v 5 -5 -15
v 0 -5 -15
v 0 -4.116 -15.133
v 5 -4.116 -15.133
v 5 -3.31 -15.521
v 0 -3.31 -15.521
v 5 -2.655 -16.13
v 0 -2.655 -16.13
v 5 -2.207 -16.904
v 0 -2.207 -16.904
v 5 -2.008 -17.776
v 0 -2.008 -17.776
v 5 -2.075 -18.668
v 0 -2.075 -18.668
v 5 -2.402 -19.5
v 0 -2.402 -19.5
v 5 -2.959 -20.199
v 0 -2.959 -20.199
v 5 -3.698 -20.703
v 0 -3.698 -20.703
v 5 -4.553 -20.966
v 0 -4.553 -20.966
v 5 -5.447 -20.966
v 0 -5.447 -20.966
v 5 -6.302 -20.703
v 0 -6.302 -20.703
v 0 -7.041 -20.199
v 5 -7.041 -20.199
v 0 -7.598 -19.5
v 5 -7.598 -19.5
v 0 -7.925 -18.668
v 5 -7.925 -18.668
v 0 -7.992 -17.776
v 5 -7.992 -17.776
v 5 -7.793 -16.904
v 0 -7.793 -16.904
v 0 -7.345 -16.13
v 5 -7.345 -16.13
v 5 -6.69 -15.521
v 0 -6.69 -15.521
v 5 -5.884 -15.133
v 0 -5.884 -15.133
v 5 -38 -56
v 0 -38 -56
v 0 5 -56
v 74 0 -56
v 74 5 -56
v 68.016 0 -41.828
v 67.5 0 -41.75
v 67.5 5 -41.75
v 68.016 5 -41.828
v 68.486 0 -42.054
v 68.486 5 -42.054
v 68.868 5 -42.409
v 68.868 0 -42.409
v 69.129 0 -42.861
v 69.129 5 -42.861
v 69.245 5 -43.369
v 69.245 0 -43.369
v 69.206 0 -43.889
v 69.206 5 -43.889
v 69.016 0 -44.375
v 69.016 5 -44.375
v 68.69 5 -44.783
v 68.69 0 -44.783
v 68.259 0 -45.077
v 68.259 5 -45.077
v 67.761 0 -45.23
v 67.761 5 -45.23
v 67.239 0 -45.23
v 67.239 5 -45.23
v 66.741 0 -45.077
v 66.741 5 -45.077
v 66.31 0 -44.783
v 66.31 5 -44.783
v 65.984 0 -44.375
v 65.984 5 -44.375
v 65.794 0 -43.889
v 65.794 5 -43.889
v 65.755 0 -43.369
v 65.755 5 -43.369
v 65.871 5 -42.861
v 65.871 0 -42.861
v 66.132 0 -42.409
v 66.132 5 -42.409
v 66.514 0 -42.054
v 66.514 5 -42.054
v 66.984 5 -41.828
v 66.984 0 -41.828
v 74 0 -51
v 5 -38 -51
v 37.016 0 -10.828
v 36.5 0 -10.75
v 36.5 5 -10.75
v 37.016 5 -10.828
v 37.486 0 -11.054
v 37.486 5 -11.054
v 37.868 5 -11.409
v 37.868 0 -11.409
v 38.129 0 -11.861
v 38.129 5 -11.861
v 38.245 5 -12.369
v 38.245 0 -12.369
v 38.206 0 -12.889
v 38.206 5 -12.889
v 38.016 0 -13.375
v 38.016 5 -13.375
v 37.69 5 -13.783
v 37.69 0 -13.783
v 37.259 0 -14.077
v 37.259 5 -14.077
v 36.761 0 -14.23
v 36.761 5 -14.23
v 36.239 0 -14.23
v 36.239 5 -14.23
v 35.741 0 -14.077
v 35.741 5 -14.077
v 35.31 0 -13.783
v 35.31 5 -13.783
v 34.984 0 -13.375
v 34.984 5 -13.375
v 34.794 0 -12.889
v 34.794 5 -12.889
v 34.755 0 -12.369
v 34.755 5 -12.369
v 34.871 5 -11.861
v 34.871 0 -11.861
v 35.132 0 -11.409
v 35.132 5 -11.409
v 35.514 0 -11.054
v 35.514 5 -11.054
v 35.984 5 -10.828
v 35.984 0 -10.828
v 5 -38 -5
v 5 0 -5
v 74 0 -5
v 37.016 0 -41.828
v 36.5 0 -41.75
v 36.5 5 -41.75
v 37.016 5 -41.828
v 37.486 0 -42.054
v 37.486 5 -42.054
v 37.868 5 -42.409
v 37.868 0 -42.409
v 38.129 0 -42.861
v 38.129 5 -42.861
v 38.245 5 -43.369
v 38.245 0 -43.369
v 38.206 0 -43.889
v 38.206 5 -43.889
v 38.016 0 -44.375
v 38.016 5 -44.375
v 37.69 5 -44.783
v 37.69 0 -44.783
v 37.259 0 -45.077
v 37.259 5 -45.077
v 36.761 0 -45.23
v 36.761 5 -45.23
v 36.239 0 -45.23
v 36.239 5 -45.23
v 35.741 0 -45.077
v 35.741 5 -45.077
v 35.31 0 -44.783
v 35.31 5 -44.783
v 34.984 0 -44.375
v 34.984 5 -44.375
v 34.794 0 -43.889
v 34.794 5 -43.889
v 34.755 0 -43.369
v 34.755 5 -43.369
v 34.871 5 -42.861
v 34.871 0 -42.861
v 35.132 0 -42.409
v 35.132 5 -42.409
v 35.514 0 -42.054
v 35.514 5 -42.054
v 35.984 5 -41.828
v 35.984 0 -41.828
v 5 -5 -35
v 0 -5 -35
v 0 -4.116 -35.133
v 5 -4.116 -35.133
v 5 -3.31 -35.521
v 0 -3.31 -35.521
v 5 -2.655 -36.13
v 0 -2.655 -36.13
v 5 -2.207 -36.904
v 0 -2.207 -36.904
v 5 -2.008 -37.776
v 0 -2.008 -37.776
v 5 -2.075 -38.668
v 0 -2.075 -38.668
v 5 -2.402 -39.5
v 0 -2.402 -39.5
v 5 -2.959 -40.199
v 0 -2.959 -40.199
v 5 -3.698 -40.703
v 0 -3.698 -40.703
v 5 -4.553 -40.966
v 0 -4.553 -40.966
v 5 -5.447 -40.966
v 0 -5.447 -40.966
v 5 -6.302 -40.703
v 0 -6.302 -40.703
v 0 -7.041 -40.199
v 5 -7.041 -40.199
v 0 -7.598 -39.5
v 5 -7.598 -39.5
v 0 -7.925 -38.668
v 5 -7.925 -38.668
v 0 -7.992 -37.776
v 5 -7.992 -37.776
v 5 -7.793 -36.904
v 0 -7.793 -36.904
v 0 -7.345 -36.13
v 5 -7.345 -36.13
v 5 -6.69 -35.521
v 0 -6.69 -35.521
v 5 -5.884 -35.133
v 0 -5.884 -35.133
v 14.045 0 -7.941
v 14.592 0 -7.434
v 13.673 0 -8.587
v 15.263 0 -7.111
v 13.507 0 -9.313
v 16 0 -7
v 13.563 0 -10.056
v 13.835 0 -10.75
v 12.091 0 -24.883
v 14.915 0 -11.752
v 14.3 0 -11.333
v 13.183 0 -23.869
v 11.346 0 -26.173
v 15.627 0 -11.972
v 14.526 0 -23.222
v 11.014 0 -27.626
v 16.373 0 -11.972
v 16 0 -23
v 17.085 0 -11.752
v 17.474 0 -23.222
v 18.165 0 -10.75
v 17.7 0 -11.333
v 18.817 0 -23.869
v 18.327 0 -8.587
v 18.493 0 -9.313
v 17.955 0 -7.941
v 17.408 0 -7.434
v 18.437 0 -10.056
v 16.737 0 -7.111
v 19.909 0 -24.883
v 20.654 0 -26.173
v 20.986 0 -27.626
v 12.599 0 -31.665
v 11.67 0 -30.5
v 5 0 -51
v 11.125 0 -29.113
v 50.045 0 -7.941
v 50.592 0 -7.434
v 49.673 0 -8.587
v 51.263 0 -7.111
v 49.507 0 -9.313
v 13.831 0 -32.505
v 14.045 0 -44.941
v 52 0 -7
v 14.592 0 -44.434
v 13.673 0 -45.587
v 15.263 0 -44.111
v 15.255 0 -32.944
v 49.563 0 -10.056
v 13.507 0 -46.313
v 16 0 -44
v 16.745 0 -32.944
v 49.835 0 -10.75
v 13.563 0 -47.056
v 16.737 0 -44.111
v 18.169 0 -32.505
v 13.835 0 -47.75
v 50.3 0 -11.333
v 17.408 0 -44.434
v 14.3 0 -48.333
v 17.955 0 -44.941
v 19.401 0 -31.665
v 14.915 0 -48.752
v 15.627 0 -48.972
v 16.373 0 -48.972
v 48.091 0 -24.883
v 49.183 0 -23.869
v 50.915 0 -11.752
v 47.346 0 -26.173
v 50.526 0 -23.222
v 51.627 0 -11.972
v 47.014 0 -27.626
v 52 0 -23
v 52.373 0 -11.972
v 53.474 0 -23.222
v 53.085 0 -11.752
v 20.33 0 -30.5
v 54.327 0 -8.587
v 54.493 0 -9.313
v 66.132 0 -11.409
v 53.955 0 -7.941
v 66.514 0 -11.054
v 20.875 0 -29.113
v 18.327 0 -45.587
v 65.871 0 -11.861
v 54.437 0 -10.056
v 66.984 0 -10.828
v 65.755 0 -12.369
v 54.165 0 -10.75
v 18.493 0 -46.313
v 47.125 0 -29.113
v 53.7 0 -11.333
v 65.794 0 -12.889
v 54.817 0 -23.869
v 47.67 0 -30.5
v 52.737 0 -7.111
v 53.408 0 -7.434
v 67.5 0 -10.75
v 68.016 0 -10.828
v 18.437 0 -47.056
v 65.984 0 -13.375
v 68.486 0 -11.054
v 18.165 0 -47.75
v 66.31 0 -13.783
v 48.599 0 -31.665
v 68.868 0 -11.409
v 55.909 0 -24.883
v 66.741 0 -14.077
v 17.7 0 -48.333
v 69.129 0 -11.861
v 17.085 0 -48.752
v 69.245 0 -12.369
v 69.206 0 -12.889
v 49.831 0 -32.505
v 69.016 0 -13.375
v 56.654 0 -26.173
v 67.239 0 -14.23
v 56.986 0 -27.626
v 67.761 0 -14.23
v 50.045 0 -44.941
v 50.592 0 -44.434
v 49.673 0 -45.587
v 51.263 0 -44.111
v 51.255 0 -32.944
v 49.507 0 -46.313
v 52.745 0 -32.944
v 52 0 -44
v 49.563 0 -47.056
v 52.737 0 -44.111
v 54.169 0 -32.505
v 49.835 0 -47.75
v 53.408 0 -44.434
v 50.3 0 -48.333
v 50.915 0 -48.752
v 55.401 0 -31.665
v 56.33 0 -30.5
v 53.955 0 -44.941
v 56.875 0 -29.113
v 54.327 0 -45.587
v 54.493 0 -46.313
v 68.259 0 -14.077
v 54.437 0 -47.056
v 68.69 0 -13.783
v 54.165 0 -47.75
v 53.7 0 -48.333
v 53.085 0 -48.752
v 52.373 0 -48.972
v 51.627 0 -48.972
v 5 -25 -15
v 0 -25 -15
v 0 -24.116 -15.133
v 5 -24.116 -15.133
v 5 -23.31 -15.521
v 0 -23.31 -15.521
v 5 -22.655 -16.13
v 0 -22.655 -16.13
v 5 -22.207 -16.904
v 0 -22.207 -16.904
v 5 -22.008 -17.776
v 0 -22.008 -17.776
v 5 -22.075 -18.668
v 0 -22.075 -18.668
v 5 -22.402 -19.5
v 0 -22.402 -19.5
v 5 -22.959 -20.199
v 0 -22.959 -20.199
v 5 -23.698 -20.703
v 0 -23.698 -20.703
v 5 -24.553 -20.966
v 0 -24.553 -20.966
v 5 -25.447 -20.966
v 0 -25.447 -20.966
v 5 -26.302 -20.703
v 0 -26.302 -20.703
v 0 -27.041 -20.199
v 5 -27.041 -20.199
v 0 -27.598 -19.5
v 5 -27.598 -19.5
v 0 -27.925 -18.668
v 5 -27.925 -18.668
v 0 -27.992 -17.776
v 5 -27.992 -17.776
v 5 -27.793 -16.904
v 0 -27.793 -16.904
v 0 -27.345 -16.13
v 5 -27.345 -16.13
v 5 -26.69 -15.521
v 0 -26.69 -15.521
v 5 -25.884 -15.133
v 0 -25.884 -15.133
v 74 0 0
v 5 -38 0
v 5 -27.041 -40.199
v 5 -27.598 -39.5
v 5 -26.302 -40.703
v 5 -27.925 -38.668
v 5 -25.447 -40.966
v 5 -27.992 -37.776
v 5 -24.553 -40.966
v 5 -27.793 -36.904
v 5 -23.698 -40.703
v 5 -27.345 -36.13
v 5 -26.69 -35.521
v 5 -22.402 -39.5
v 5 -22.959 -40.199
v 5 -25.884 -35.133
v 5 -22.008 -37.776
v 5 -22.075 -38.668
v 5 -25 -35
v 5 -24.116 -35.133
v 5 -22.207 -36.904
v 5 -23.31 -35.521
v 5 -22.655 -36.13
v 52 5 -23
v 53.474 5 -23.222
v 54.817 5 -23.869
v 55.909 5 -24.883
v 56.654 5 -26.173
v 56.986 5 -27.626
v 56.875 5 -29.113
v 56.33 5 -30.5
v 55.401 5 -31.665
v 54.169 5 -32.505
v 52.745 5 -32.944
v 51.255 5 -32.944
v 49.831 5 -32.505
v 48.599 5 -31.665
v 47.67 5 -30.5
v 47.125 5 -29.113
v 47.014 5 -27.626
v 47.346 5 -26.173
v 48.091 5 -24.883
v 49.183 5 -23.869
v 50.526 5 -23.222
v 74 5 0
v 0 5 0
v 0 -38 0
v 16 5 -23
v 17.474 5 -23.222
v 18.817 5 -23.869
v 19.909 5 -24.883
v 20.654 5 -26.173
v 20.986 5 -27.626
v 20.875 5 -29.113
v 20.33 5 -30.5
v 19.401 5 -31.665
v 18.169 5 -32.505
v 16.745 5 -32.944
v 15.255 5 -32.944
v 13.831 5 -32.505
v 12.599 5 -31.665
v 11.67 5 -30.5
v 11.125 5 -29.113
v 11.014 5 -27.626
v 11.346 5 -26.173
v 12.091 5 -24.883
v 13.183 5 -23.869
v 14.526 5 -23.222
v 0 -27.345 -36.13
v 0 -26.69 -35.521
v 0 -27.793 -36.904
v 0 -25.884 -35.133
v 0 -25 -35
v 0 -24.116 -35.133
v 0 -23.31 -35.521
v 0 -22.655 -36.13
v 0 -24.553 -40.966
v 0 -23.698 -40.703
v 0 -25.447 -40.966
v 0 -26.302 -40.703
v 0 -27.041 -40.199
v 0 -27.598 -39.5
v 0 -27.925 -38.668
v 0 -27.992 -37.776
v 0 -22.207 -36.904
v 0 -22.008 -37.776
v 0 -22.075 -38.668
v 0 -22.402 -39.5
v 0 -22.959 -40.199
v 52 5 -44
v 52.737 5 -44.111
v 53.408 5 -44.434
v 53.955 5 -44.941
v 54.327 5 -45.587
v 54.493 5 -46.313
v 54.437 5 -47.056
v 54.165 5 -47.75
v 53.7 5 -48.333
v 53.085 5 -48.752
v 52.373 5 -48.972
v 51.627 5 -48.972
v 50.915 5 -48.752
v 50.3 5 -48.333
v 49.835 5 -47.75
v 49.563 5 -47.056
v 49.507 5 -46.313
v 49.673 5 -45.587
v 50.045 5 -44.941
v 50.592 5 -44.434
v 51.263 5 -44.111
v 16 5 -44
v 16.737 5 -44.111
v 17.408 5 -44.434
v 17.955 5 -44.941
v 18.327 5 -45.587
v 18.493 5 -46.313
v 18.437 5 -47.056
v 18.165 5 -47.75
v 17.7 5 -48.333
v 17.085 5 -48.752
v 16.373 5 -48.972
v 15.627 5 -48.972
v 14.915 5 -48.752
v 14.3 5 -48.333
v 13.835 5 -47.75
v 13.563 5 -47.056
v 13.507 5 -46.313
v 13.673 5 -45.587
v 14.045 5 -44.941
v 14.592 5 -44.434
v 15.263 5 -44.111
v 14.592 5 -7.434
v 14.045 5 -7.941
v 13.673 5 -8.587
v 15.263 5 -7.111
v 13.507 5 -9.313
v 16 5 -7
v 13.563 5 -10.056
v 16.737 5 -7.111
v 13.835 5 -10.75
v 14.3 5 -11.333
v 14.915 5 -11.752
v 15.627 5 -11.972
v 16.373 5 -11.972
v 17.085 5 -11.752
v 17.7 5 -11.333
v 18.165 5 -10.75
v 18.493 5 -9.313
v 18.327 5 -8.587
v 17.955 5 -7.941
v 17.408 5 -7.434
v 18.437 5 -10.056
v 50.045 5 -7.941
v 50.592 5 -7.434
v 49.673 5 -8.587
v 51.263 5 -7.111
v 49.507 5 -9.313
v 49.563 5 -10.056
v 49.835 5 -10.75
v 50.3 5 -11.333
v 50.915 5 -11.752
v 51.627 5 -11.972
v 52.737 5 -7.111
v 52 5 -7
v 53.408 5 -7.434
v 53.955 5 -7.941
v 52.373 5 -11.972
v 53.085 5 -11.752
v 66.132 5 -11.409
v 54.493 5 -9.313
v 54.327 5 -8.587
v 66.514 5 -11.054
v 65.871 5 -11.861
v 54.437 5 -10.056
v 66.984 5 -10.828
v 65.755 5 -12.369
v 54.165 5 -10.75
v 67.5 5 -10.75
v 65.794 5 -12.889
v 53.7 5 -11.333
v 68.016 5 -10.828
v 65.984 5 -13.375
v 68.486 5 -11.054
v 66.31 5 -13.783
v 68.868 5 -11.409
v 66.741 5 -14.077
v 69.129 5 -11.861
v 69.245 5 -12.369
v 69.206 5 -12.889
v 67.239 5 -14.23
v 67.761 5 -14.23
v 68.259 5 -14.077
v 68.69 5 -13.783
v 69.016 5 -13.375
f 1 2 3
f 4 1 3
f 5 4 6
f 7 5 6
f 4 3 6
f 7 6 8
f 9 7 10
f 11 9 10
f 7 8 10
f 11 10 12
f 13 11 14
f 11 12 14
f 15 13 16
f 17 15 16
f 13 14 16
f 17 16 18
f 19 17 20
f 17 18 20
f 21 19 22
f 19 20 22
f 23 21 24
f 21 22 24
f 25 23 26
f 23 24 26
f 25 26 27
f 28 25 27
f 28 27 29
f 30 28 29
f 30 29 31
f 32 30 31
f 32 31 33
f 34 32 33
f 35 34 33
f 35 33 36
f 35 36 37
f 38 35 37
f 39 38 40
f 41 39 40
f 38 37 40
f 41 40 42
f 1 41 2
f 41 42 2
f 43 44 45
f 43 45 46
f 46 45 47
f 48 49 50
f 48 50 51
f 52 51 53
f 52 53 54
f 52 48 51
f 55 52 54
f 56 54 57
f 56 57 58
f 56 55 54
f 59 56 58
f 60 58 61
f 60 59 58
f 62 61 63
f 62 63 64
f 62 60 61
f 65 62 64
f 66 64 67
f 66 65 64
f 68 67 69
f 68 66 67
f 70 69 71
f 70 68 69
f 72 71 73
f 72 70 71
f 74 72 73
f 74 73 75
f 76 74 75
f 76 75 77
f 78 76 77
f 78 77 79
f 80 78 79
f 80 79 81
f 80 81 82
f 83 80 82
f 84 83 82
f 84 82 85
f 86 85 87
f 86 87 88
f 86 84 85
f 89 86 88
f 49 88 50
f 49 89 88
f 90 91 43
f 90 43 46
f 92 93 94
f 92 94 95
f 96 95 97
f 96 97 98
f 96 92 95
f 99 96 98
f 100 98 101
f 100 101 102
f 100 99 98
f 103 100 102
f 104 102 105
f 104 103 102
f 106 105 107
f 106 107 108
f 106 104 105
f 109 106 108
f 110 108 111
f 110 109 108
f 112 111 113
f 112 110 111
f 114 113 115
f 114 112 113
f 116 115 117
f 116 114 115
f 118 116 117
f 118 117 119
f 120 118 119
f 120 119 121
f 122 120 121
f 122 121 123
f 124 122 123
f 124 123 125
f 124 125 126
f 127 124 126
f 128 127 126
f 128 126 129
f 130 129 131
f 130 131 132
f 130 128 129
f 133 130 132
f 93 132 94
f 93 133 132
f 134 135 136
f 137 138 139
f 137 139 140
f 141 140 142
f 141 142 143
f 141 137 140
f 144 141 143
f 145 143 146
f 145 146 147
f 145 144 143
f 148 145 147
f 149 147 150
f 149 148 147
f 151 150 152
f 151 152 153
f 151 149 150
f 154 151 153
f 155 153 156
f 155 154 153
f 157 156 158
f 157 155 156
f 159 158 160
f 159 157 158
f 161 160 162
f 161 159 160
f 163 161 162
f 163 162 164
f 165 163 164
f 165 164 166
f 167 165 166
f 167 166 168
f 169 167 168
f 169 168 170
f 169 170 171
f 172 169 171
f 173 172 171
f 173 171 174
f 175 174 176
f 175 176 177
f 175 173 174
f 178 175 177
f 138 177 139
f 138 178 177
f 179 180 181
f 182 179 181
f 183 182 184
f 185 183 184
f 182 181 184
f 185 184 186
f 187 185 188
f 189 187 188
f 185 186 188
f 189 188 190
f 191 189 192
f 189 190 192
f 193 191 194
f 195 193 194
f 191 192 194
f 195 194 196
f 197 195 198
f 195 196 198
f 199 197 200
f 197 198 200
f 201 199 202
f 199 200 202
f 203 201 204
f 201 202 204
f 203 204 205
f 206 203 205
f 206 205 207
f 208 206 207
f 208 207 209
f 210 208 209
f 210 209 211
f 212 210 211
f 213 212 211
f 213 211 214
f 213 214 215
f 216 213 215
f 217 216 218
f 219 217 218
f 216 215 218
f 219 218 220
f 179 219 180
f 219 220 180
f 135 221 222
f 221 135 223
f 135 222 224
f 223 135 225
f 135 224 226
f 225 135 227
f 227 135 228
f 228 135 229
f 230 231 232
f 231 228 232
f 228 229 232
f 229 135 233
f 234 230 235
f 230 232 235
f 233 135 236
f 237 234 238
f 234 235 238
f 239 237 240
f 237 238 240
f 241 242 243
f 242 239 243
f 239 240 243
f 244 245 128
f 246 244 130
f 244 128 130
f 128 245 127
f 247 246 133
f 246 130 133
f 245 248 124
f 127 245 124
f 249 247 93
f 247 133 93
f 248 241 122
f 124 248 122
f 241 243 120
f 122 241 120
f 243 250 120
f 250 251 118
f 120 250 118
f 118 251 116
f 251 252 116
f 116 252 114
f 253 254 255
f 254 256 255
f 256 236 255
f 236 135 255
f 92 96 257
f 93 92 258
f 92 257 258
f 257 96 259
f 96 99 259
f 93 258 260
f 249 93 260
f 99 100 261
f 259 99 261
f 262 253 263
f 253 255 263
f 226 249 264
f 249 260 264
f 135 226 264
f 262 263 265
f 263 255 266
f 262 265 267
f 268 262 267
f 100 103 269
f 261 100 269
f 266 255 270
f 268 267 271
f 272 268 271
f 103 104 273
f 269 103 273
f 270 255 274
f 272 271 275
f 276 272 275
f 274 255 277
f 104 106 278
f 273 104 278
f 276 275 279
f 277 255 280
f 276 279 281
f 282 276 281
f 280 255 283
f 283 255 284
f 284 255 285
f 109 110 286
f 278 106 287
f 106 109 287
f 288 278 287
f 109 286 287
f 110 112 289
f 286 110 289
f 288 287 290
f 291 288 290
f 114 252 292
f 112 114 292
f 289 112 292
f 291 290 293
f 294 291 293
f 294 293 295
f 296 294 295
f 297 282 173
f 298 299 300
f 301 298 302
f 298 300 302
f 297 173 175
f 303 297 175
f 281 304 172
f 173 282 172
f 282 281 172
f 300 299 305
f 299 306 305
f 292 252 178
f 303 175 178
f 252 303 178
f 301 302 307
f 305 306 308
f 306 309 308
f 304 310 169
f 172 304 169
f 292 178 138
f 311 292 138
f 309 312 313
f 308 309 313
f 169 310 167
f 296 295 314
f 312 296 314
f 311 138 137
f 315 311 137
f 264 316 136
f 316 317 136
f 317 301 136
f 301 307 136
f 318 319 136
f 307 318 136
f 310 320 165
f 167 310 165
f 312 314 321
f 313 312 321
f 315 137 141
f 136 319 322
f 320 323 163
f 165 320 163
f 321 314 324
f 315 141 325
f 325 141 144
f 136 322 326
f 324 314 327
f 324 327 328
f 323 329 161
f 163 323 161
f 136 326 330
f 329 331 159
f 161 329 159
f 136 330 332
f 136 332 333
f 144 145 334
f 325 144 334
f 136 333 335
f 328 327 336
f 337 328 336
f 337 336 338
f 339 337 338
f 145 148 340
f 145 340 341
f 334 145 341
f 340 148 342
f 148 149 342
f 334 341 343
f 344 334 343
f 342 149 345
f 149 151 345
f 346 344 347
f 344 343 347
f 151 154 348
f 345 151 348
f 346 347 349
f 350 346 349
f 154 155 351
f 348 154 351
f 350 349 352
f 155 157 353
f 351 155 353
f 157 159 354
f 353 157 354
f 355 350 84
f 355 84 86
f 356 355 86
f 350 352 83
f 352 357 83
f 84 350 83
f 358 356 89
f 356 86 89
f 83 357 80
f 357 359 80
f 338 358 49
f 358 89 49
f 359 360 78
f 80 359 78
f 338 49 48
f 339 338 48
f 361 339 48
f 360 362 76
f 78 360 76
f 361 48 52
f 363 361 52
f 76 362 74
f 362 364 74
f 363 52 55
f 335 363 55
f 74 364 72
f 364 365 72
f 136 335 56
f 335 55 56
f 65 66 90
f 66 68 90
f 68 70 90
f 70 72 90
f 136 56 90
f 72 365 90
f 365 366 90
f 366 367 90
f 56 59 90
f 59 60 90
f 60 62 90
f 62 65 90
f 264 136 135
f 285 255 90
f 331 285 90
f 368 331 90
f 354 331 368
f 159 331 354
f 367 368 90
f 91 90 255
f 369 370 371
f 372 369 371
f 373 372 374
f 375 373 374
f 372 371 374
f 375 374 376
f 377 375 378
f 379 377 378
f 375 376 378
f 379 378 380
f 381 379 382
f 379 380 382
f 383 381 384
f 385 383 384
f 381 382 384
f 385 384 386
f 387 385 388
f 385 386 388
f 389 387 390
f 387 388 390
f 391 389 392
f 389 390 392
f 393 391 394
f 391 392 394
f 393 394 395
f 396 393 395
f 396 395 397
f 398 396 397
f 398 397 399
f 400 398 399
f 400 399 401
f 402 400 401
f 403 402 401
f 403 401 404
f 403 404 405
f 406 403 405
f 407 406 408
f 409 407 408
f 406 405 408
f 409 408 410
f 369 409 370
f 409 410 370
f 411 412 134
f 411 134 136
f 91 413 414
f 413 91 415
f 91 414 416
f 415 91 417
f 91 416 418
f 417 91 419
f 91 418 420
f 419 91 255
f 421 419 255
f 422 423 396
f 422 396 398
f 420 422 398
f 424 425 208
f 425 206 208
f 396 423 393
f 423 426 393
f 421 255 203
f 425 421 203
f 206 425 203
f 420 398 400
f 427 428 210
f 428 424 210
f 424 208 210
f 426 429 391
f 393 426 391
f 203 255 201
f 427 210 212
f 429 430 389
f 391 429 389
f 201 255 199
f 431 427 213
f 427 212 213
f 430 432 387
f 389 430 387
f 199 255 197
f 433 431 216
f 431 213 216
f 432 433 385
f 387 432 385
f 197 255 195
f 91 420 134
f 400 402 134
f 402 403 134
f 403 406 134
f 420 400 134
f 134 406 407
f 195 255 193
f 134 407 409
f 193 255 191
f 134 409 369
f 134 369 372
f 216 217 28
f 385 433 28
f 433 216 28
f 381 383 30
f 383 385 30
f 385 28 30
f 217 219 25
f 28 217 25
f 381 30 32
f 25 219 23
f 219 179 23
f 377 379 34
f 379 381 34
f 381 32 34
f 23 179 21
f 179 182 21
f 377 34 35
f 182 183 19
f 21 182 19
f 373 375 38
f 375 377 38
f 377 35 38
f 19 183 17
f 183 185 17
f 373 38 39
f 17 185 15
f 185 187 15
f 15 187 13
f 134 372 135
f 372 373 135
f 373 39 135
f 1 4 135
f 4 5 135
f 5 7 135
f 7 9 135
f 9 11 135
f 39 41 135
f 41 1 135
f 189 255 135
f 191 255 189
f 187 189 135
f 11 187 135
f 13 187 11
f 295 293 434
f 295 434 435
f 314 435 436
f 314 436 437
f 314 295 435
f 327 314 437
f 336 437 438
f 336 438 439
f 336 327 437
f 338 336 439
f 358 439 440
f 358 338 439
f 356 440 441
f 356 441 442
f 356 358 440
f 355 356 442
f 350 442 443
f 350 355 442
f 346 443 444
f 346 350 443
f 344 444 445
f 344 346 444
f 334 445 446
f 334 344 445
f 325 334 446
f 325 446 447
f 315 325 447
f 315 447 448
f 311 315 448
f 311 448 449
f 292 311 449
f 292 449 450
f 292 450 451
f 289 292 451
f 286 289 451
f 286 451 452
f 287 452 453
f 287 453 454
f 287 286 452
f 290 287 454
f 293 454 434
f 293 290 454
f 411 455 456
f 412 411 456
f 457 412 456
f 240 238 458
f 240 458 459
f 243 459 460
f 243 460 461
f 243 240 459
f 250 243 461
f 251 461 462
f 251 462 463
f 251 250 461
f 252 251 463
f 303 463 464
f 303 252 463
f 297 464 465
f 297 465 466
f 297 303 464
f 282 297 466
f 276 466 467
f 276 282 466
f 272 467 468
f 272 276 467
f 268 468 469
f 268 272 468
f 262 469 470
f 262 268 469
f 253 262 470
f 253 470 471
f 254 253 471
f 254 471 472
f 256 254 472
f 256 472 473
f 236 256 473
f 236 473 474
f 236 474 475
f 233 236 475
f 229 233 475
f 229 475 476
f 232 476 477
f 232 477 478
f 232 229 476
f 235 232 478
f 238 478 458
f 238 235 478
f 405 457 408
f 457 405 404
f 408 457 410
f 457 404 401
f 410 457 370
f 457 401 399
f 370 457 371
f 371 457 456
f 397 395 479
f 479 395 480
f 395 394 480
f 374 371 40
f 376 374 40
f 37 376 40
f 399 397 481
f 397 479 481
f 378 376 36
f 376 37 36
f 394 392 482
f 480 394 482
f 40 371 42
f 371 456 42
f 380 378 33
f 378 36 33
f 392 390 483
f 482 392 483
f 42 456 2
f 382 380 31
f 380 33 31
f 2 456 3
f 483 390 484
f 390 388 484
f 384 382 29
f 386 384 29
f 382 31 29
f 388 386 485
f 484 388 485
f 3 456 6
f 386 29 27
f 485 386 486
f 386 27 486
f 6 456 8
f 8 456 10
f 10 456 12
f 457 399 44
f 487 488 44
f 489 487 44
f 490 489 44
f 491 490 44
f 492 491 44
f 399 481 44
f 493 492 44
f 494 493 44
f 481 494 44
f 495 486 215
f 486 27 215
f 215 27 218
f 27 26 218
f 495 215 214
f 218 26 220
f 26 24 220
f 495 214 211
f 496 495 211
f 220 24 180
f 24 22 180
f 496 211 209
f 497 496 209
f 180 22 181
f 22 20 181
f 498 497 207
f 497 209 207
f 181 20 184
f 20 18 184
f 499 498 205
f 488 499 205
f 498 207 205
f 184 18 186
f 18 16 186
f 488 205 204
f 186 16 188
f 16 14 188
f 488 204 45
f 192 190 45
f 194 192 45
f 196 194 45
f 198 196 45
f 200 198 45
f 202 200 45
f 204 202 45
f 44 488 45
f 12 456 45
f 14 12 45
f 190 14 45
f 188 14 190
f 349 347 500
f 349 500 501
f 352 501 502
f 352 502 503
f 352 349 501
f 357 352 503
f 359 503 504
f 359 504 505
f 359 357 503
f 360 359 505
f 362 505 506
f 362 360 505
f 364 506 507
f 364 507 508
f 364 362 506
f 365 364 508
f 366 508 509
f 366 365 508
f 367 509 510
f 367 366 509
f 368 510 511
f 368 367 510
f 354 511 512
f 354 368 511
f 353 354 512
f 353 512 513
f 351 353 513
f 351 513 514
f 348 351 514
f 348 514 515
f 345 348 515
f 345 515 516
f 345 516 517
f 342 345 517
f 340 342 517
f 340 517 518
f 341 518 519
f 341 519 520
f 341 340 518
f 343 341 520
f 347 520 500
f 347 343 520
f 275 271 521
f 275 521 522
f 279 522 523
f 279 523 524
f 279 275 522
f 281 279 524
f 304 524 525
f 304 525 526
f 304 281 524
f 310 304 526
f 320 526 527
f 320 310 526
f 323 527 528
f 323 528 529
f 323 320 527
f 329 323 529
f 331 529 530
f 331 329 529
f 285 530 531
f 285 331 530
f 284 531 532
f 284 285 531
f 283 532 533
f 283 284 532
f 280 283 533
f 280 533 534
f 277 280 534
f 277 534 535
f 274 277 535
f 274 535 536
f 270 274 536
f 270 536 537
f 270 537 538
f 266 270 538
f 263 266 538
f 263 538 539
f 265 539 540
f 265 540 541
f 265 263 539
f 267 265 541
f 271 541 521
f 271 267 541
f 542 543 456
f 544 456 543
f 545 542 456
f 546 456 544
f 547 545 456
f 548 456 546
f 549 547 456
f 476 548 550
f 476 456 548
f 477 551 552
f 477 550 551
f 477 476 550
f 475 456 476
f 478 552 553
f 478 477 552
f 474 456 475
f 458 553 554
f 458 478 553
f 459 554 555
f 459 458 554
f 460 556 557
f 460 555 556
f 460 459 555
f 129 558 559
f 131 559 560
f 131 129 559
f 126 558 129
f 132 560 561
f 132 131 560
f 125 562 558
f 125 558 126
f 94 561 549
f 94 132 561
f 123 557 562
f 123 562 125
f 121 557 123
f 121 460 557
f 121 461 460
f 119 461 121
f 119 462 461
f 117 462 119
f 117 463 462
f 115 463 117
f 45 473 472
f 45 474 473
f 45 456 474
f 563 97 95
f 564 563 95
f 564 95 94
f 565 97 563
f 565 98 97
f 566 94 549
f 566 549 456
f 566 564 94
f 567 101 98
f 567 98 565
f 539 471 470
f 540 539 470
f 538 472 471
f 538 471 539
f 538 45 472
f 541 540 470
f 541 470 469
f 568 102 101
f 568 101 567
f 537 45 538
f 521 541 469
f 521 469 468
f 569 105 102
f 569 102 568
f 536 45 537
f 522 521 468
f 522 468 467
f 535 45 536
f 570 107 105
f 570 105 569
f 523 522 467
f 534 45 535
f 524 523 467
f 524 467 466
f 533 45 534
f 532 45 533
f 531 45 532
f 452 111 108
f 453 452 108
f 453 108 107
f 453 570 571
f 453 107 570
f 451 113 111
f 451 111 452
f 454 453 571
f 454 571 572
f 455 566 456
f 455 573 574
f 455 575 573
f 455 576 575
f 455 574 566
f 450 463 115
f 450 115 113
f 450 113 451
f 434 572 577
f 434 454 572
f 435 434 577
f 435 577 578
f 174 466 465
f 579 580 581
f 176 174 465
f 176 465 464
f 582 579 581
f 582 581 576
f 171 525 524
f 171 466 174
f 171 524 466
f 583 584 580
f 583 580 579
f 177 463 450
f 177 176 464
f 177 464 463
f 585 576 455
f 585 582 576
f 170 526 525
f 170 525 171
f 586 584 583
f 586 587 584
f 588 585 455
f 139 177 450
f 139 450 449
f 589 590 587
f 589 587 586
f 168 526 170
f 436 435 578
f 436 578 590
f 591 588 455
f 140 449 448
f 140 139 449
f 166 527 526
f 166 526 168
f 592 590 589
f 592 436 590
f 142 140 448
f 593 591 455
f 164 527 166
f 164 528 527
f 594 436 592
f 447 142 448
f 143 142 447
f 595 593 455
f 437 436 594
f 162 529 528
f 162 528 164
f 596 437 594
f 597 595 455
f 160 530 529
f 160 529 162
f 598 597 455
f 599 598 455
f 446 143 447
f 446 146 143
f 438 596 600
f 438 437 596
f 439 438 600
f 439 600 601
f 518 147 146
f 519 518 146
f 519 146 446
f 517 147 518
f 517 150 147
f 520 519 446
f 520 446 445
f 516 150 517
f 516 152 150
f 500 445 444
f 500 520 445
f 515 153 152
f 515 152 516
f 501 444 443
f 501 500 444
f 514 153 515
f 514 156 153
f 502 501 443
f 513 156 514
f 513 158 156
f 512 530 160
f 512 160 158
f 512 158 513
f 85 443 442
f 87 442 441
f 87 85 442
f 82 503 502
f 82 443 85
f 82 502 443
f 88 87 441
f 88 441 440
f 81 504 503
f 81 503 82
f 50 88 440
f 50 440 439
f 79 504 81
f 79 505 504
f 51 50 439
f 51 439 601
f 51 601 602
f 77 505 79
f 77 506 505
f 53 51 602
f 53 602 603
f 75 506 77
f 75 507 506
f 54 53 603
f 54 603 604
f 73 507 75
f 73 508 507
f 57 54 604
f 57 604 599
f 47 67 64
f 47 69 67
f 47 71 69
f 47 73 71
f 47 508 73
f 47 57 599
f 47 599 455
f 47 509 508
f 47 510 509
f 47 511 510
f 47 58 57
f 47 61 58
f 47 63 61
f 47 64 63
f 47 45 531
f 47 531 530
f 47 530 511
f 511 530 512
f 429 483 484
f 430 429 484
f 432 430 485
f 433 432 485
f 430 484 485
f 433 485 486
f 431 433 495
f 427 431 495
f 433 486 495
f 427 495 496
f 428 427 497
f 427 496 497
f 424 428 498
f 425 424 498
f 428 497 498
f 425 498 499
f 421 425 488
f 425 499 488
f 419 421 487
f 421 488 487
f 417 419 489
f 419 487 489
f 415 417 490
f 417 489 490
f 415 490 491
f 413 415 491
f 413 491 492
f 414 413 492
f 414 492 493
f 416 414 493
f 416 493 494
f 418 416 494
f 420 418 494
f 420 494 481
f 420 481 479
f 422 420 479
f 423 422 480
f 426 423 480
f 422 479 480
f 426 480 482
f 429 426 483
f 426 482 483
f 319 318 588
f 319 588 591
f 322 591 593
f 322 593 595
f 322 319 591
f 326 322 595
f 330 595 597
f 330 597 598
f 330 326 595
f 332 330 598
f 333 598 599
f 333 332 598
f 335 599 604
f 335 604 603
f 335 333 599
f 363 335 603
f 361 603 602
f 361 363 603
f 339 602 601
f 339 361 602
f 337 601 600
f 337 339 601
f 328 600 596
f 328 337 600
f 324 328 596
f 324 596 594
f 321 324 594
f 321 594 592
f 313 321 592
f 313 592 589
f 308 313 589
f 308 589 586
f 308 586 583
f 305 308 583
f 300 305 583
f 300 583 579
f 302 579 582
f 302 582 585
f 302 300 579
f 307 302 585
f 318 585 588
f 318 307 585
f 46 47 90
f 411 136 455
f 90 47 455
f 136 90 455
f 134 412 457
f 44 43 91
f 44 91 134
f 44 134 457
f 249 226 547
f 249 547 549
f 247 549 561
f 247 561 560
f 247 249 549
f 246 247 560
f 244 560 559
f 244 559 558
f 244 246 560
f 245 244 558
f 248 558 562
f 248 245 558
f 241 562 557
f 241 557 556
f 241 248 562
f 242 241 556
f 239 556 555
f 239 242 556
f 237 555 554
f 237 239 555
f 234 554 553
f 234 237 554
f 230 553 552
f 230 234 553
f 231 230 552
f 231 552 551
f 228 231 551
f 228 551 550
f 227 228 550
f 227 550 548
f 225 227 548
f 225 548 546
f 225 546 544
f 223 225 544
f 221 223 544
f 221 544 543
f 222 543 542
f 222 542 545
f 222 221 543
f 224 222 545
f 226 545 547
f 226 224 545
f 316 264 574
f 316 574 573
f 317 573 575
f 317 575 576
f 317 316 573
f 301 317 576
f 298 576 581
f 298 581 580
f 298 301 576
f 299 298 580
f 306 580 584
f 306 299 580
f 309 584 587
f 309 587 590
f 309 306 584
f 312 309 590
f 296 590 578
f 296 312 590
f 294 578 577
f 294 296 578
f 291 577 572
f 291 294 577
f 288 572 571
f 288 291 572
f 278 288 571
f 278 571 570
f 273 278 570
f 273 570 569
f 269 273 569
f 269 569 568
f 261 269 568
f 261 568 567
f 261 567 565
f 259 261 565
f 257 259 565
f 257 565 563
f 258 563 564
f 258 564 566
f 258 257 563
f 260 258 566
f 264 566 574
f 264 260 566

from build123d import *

# Parameters (mm, degrees)
SKETCH_1_W          = 74
SKETCH_1_H          = 56
SKETCH_1_R          = 2.5
SKETCH_1_R_2        = 5
SKETCH_1_R_3        = 1.75
EXTRUDE_1_DEPTH     = 5
EXTRUDE_2_DEPTH     = 38
CUT_EXTRUDE_1_REACH = 102.28
SKETCH_4_R          = 3
CUT_EXTRUDE_2_DEPTH = 5


with BuildPart() as part:
    # Эскиз1 → Бобышка-Вытянуть1 (new body)
    with BuildSketch(Plane(origin=(0, 0, 0), x_dir=(1, 0, 0), z_dir=(0, 1, 0))):
        with Locations((37, 28)):
            Rectangle(SKETCH_1_W, SKETCH_1_H)
        with Locations(Location((16, 46.5, 0), (0, 0, 270))):
            Circle(SKETCH_1_R, mode=Mode.SUBTRACT)
        with Locations(Location((16, 9.5, 0), (0, 0, 270))):
            Circle(SKETCH_1_R, mode=Mode.SUBTRACT)
        with Locations(Location((52, 46.5, 0), (0, 0, 270))):
            Circle(SKETCH_1_R, mode=Mode.SUBTRACT)
        with Locations(Location((52, 9.5, 0), (0, 0, 270))):
            Circle(SKETCH_1_R, mode=Mode.SUBTRACT)
        with Locations(Location((52, 28, 0), (0, 0, 270))):
            Circle(SKETCH_1_R_2, mode=Mode.SUBTRACT)
        with Locations(Location((67.5, 12.5, 0), (0, 0, 270))):
            Circle(SKETCH_1_R_3, mode=Mode.SUBTRACT)
        with Locations(Location((67.5, 43.5, 0), (0, 0, 270))):
            Circle(SKETCH_1_R_3, mode=Mode.SUBTRACT)
        with Locations(Location((36.5, 43.5, 0), (0, 0, 270))):
            Circle(SKETCH_1_R_3, mode=Mode.SUBTRACT)
        with Locations(Location((36.5, 12.5, 0), (0, 0, 270))):
            Circle(SKETCH_1_R_3, mode=Mode.SUBTRACT)
        with Locations(Location((16, 28, 0), (0, 0, 270))):
            Circle(SKETCH_1_R_2, mode=Mode.SUBTRACT)
    extrude(amount=EXTRUDE_1_DEPTH)

    # Эскиз2 → Бобышка-Вытянуть2 (add)
    with BuildSketch(Plane(origin=(0, 0, 0), x_dir=(-1, 0, 0), z_dir=(0, -1, 0))):
        Polygon((-74, 0), (0, 0), (0, 56), (-74, 56), (-74, 51), (-5, 51), (-5, 5), (-74, 5), align=None)
    extrude(amount=EXTRUDE_2_DEPTH)

    # Вырез-Вытянуть1: up to this face of the body (flat: up to its plane)
    cut_extrude_1_end = Plane(part.part.faces().sort_by_distance((37, -16.5, -56))[0])
    # Эскиз3 → Вырез-Вытянуть1 (cut, up to the picked face)
    with BuildSketch(Plane.XY, mode=Mode.PRIVATE) as cut_extrude_1_sk1:
        Polygon((5, -38), (74, 0), (74, -38), align=None)
    cut_extrude_1_tool1 = split(extrude(cut_extrude_1_sk1.sketch, amount=-CUT_EXTRUDE_1_REACH, mode=Mode.PRIVATE), bisect_by=cut_extrude_1_end, keep=Keep.BOTH, mode=Mode.PRIVATE)
    add(cut_extrude_1_tool1.solids().sort_by(Axis((51, -25.333333, 0), (0, 0, -1)))[0], mode=Mode.SUBTRACT)

    # Эскиз4 → Вырез-Вытянуть2 (cut)
    with BuildSketch(Plane.ZY):
        with Locations((-18, -25)):
            Circle(SKETCH_4_R)
        with Locations((-18, -5)):
            Circle(SKETCH_4_R)
        with Locations((-38, -5)):
            Circle(SKETCH_4_R)
        with Locations((-38, -25)):
            Circle(SKETCH_4_R)
    extrude(amount=-CUT_EXTRUDE_2_DEPTH, mode=Mode.SUBTRACT)


solid = part.part
